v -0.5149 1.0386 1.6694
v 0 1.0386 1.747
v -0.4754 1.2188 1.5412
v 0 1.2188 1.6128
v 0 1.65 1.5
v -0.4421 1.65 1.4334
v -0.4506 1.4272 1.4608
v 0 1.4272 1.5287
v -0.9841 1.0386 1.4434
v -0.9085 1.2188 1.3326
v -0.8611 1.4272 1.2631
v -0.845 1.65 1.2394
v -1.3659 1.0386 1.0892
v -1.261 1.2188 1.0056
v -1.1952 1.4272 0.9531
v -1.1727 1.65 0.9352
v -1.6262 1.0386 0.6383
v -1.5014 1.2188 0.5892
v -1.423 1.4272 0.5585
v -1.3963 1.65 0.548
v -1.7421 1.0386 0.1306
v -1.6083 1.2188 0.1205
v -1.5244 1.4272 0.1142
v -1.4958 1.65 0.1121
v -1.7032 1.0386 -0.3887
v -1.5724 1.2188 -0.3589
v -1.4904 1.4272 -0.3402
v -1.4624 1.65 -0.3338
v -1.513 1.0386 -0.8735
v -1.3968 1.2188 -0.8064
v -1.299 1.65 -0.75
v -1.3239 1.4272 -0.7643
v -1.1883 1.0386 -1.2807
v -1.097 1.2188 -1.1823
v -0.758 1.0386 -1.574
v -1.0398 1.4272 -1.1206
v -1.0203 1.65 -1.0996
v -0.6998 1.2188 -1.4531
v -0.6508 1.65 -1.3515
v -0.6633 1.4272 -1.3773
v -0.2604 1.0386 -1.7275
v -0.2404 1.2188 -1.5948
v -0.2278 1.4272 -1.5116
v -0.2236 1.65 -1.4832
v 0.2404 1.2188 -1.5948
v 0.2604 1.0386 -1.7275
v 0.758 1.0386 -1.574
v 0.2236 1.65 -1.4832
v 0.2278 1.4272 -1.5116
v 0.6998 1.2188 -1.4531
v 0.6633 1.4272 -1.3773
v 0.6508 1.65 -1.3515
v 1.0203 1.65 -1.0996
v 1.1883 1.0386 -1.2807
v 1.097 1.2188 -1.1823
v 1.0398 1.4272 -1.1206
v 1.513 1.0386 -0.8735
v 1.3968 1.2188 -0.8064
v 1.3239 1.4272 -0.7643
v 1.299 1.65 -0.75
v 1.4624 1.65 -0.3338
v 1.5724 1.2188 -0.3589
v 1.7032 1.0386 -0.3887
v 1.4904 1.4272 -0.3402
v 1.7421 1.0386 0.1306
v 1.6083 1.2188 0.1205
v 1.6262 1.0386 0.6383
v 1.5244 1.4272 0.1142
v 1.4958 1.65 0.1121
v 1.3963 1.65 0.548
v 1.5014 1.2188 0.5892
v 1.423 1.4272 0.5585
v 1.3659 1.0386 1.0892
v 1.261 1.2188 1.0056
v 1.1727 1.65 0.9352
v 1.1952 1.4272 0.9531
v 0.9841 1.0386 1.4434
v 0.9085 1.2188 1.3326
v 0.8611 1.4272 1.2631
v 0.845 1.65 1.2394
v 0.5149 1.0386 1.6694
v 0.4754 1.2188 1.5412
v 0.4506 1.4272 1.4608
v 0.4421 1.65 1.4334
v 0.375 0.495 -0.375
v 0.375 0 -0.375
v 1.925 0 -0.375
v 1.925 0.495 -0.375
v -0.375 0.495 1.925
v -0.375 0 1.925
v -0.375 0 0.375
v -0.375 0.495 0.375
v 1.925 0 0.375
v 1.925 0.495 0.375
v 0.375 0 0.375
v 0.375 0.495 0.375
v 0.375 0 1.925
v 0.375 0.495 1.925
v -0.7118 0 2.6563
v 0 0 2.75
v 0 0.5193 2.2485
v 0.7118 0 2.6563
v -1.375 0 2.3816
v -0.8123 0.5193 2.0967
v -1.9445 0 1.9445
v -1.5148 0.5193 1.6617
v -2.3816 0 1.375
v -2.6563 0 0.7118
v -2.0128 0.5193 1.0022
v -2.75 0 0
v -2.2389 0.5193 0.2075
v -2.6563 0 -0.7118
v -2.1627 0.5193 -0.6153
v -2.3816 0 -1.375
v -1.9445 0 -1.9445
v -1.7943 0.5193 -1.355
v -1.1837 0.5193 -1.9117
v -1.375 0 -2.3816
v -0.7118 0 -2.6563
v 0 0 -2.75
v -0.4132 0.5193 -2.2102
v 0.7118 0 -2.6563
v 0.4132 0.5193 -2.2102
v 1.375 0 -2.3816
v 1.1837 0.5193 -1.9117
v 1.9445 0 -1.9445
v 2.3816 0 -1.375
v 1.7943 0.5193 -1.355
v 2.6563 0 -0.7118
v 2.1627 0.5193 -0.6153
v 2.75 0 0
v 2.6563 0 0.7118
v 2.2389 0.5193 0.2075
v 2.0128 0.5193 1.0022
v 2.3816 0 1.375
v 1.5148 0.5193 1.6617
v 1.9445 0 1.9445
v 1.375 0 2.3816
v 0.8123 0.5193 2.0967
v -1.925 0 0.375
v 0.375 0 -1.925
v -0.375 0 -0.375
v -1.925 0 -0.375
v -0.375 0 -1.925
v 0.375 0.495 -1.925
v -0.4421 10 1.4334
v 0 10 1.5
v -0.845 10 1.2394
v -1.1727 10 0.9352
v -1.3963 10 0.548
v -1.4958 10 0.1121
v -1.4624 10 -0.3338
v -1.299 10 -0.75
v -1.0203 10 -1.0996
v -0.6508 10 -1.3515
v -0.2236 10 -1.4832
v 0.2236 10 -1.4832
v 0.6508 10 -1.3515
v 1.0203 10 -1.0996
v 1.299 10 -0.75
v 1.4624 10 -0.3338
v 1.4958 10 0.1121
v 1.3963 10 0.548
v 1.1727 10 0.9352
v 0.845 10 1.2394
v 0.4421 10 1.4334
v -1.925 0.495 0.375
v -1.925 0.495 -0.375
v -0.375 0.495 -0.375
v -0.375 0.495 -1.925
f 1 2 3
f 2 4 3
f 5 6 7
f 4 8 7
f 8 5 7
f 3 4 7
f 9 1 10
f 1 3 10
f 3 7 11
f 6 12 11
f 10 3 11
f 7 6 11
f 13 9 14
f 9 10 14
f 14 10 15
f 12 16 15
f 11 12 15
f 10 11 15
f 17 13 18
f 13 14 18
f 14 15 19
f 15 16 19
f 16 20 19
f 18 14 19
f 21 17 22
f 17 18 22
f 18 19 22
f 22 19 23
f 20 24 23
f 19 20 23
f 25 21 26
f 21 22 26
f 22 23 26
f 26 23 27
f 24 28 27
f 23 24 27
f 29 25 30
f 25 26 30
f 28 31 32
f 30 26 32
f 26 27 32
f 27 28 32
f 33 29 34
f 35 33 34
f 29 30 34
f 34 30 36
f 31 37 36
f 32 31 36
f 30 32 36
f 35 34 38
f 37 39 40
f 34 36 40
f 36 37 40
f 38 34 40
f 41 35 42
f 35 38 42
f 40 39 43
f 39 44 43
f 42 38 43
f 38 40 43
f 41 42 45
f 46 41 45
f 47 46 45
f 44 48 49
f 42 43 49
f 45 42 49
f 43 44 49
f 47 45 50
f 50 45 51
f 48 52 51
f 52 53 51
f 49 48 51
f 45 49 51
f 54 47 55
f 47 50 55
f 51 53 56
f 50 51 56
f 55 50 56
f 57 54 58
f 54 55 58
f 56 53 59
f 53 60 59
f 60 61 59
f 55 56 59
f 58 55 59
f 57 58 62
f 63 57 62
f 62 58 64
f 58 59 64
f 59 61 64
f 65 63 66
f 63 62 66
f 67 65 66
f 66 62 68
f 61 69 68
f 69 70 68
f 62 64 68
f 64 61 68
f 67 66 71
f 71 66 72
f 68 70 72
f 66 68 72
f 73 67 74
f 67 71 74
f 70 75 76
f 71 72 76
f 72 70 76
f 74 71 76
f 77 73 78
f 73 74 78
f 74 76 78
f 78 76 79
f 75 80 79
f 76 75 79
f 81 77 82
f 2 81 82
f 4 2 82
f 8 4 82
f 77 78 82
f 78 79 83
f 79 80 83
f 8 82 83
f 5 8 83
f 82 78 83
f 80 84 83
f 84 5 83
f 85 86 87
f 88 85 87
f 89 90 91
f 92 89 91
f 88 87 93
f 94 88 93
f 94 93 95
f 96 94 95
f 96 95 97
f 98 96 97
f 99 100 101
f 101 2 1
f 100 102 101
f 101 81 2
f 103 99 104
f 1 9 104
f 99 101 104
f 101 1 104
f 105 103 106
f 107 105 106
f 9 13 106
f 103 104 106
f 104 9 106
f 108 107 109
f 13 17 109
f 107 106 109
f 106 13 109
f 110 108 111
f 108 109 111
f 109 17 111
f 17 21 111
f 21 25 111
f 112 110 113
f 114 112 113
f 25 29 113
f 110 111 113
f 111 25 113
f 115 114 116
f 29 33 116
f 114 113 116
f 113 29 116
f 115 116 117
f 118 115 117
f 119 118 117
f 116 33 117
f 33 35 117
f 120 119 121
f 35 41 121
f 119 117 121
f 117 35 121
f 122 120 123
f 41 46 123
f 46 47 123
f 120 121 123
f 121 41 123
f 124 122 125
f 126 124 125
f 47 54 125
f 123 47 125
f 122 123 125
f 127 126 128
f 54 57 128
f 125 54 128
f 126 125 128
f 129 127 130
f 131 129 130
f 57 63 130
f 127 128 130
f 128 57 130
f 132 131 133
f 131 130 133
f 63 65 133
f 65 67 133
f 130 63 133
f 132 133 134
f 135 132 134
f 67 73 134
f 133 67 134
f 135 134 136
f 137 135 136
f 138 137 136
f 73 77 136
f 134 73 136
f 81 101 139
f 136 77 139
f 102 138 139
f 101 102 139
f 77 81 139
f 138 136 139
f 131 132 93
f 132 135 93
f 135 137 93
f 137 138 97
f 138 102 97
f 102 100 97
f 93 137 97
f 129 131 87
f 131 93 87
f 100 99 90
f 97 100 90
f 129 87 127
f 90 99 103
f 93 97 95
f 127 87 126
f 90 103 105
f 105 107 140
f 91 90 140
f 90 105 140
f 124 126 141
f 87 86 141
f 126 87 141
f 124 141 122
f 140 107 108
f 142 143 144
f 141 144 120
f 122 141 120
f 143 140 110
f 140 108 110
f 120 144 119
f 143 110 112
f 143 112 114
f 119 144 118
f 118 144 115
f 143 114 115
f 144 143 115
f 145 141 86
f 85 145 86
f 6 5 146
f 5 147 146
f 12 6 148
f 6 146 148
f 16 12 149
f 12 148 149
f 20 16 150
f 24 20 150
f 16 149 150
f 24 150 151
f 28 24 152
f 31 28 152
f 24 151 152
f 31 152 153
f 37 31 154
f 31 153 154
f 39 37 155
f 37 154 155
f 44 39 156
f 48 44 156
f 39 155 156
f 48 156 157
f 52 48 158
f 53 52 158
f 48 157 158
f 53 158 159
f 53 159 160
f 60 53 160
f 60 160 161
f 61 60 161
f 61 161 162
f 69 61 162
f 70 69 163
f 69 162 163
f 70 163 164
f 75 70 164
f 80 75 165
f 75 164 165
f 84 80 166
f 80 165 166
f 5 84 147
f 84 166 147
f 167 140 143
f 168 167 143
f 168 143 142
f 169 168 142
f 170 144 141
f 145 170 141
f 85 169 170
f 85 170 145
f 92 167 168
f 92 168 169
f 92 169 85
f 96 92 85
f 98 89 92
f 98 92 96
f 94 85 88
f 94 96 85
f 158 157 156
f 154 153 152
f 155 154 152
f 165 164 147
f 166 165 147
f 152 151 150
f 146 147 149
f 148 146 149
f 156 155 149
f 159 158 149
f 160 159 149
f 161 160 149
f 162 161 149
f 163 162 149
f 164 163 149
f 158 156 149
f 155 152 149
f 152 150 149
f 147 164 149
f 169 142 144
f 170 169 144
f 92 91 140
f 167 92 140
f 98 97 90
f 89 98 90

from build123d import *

# Parameters (mm, degrees)
CUT_EXTRUDE_1_DEPTH = 0.495


with BuildPart() as part:
    # 草图1 → 旋转1 (revolve)
    with BuildSketch(Plane.XY, mode=Mode.PRIVATE) as revolve_1_sk:
        with BuildLine():
            Line((0, 0), (2.75, 0))
            Line((2.75, 0), (1.747011561, 1.038624933))
            ThreePointArc((1.747011561, 1.038624933), (1.564086143, 1.320305375), (1.5, 1.65))
            Line((1.5, 1.65), (1.5, 10))
            Line((1.5, 10), (0, 10))
            Line((0, 10), (0, 0))
        make_face()
    revolve(revolve_1_sk.sketch.rotate(Axis((0, 3.09547163, 0), (0, -1, 0)), 90), axis=Axis((0, 3.09547163, 0), (0, -1, 0)))

    # 草图2 → 切除-拉伸1 (cut)
    with BuildSketch(Plane.XZ):
        Polygon((-0.375, -0.375), (-0.375, -1.925), (0.375, -1.925), (0.375, -0.375), (1.925, -0.375), (1.925, 0.375), (0.375, 0.375), (0.375, 1.925), (-0.375, 1.925), (-0.375, 0.375), (-1.925, 0.375), (-1.925, -0.375), align=None)
    extrude(amount=-CUT_EXTRUDE_1_DEPTH, mode=Mode.SUBTRACT)


solid = part.part
